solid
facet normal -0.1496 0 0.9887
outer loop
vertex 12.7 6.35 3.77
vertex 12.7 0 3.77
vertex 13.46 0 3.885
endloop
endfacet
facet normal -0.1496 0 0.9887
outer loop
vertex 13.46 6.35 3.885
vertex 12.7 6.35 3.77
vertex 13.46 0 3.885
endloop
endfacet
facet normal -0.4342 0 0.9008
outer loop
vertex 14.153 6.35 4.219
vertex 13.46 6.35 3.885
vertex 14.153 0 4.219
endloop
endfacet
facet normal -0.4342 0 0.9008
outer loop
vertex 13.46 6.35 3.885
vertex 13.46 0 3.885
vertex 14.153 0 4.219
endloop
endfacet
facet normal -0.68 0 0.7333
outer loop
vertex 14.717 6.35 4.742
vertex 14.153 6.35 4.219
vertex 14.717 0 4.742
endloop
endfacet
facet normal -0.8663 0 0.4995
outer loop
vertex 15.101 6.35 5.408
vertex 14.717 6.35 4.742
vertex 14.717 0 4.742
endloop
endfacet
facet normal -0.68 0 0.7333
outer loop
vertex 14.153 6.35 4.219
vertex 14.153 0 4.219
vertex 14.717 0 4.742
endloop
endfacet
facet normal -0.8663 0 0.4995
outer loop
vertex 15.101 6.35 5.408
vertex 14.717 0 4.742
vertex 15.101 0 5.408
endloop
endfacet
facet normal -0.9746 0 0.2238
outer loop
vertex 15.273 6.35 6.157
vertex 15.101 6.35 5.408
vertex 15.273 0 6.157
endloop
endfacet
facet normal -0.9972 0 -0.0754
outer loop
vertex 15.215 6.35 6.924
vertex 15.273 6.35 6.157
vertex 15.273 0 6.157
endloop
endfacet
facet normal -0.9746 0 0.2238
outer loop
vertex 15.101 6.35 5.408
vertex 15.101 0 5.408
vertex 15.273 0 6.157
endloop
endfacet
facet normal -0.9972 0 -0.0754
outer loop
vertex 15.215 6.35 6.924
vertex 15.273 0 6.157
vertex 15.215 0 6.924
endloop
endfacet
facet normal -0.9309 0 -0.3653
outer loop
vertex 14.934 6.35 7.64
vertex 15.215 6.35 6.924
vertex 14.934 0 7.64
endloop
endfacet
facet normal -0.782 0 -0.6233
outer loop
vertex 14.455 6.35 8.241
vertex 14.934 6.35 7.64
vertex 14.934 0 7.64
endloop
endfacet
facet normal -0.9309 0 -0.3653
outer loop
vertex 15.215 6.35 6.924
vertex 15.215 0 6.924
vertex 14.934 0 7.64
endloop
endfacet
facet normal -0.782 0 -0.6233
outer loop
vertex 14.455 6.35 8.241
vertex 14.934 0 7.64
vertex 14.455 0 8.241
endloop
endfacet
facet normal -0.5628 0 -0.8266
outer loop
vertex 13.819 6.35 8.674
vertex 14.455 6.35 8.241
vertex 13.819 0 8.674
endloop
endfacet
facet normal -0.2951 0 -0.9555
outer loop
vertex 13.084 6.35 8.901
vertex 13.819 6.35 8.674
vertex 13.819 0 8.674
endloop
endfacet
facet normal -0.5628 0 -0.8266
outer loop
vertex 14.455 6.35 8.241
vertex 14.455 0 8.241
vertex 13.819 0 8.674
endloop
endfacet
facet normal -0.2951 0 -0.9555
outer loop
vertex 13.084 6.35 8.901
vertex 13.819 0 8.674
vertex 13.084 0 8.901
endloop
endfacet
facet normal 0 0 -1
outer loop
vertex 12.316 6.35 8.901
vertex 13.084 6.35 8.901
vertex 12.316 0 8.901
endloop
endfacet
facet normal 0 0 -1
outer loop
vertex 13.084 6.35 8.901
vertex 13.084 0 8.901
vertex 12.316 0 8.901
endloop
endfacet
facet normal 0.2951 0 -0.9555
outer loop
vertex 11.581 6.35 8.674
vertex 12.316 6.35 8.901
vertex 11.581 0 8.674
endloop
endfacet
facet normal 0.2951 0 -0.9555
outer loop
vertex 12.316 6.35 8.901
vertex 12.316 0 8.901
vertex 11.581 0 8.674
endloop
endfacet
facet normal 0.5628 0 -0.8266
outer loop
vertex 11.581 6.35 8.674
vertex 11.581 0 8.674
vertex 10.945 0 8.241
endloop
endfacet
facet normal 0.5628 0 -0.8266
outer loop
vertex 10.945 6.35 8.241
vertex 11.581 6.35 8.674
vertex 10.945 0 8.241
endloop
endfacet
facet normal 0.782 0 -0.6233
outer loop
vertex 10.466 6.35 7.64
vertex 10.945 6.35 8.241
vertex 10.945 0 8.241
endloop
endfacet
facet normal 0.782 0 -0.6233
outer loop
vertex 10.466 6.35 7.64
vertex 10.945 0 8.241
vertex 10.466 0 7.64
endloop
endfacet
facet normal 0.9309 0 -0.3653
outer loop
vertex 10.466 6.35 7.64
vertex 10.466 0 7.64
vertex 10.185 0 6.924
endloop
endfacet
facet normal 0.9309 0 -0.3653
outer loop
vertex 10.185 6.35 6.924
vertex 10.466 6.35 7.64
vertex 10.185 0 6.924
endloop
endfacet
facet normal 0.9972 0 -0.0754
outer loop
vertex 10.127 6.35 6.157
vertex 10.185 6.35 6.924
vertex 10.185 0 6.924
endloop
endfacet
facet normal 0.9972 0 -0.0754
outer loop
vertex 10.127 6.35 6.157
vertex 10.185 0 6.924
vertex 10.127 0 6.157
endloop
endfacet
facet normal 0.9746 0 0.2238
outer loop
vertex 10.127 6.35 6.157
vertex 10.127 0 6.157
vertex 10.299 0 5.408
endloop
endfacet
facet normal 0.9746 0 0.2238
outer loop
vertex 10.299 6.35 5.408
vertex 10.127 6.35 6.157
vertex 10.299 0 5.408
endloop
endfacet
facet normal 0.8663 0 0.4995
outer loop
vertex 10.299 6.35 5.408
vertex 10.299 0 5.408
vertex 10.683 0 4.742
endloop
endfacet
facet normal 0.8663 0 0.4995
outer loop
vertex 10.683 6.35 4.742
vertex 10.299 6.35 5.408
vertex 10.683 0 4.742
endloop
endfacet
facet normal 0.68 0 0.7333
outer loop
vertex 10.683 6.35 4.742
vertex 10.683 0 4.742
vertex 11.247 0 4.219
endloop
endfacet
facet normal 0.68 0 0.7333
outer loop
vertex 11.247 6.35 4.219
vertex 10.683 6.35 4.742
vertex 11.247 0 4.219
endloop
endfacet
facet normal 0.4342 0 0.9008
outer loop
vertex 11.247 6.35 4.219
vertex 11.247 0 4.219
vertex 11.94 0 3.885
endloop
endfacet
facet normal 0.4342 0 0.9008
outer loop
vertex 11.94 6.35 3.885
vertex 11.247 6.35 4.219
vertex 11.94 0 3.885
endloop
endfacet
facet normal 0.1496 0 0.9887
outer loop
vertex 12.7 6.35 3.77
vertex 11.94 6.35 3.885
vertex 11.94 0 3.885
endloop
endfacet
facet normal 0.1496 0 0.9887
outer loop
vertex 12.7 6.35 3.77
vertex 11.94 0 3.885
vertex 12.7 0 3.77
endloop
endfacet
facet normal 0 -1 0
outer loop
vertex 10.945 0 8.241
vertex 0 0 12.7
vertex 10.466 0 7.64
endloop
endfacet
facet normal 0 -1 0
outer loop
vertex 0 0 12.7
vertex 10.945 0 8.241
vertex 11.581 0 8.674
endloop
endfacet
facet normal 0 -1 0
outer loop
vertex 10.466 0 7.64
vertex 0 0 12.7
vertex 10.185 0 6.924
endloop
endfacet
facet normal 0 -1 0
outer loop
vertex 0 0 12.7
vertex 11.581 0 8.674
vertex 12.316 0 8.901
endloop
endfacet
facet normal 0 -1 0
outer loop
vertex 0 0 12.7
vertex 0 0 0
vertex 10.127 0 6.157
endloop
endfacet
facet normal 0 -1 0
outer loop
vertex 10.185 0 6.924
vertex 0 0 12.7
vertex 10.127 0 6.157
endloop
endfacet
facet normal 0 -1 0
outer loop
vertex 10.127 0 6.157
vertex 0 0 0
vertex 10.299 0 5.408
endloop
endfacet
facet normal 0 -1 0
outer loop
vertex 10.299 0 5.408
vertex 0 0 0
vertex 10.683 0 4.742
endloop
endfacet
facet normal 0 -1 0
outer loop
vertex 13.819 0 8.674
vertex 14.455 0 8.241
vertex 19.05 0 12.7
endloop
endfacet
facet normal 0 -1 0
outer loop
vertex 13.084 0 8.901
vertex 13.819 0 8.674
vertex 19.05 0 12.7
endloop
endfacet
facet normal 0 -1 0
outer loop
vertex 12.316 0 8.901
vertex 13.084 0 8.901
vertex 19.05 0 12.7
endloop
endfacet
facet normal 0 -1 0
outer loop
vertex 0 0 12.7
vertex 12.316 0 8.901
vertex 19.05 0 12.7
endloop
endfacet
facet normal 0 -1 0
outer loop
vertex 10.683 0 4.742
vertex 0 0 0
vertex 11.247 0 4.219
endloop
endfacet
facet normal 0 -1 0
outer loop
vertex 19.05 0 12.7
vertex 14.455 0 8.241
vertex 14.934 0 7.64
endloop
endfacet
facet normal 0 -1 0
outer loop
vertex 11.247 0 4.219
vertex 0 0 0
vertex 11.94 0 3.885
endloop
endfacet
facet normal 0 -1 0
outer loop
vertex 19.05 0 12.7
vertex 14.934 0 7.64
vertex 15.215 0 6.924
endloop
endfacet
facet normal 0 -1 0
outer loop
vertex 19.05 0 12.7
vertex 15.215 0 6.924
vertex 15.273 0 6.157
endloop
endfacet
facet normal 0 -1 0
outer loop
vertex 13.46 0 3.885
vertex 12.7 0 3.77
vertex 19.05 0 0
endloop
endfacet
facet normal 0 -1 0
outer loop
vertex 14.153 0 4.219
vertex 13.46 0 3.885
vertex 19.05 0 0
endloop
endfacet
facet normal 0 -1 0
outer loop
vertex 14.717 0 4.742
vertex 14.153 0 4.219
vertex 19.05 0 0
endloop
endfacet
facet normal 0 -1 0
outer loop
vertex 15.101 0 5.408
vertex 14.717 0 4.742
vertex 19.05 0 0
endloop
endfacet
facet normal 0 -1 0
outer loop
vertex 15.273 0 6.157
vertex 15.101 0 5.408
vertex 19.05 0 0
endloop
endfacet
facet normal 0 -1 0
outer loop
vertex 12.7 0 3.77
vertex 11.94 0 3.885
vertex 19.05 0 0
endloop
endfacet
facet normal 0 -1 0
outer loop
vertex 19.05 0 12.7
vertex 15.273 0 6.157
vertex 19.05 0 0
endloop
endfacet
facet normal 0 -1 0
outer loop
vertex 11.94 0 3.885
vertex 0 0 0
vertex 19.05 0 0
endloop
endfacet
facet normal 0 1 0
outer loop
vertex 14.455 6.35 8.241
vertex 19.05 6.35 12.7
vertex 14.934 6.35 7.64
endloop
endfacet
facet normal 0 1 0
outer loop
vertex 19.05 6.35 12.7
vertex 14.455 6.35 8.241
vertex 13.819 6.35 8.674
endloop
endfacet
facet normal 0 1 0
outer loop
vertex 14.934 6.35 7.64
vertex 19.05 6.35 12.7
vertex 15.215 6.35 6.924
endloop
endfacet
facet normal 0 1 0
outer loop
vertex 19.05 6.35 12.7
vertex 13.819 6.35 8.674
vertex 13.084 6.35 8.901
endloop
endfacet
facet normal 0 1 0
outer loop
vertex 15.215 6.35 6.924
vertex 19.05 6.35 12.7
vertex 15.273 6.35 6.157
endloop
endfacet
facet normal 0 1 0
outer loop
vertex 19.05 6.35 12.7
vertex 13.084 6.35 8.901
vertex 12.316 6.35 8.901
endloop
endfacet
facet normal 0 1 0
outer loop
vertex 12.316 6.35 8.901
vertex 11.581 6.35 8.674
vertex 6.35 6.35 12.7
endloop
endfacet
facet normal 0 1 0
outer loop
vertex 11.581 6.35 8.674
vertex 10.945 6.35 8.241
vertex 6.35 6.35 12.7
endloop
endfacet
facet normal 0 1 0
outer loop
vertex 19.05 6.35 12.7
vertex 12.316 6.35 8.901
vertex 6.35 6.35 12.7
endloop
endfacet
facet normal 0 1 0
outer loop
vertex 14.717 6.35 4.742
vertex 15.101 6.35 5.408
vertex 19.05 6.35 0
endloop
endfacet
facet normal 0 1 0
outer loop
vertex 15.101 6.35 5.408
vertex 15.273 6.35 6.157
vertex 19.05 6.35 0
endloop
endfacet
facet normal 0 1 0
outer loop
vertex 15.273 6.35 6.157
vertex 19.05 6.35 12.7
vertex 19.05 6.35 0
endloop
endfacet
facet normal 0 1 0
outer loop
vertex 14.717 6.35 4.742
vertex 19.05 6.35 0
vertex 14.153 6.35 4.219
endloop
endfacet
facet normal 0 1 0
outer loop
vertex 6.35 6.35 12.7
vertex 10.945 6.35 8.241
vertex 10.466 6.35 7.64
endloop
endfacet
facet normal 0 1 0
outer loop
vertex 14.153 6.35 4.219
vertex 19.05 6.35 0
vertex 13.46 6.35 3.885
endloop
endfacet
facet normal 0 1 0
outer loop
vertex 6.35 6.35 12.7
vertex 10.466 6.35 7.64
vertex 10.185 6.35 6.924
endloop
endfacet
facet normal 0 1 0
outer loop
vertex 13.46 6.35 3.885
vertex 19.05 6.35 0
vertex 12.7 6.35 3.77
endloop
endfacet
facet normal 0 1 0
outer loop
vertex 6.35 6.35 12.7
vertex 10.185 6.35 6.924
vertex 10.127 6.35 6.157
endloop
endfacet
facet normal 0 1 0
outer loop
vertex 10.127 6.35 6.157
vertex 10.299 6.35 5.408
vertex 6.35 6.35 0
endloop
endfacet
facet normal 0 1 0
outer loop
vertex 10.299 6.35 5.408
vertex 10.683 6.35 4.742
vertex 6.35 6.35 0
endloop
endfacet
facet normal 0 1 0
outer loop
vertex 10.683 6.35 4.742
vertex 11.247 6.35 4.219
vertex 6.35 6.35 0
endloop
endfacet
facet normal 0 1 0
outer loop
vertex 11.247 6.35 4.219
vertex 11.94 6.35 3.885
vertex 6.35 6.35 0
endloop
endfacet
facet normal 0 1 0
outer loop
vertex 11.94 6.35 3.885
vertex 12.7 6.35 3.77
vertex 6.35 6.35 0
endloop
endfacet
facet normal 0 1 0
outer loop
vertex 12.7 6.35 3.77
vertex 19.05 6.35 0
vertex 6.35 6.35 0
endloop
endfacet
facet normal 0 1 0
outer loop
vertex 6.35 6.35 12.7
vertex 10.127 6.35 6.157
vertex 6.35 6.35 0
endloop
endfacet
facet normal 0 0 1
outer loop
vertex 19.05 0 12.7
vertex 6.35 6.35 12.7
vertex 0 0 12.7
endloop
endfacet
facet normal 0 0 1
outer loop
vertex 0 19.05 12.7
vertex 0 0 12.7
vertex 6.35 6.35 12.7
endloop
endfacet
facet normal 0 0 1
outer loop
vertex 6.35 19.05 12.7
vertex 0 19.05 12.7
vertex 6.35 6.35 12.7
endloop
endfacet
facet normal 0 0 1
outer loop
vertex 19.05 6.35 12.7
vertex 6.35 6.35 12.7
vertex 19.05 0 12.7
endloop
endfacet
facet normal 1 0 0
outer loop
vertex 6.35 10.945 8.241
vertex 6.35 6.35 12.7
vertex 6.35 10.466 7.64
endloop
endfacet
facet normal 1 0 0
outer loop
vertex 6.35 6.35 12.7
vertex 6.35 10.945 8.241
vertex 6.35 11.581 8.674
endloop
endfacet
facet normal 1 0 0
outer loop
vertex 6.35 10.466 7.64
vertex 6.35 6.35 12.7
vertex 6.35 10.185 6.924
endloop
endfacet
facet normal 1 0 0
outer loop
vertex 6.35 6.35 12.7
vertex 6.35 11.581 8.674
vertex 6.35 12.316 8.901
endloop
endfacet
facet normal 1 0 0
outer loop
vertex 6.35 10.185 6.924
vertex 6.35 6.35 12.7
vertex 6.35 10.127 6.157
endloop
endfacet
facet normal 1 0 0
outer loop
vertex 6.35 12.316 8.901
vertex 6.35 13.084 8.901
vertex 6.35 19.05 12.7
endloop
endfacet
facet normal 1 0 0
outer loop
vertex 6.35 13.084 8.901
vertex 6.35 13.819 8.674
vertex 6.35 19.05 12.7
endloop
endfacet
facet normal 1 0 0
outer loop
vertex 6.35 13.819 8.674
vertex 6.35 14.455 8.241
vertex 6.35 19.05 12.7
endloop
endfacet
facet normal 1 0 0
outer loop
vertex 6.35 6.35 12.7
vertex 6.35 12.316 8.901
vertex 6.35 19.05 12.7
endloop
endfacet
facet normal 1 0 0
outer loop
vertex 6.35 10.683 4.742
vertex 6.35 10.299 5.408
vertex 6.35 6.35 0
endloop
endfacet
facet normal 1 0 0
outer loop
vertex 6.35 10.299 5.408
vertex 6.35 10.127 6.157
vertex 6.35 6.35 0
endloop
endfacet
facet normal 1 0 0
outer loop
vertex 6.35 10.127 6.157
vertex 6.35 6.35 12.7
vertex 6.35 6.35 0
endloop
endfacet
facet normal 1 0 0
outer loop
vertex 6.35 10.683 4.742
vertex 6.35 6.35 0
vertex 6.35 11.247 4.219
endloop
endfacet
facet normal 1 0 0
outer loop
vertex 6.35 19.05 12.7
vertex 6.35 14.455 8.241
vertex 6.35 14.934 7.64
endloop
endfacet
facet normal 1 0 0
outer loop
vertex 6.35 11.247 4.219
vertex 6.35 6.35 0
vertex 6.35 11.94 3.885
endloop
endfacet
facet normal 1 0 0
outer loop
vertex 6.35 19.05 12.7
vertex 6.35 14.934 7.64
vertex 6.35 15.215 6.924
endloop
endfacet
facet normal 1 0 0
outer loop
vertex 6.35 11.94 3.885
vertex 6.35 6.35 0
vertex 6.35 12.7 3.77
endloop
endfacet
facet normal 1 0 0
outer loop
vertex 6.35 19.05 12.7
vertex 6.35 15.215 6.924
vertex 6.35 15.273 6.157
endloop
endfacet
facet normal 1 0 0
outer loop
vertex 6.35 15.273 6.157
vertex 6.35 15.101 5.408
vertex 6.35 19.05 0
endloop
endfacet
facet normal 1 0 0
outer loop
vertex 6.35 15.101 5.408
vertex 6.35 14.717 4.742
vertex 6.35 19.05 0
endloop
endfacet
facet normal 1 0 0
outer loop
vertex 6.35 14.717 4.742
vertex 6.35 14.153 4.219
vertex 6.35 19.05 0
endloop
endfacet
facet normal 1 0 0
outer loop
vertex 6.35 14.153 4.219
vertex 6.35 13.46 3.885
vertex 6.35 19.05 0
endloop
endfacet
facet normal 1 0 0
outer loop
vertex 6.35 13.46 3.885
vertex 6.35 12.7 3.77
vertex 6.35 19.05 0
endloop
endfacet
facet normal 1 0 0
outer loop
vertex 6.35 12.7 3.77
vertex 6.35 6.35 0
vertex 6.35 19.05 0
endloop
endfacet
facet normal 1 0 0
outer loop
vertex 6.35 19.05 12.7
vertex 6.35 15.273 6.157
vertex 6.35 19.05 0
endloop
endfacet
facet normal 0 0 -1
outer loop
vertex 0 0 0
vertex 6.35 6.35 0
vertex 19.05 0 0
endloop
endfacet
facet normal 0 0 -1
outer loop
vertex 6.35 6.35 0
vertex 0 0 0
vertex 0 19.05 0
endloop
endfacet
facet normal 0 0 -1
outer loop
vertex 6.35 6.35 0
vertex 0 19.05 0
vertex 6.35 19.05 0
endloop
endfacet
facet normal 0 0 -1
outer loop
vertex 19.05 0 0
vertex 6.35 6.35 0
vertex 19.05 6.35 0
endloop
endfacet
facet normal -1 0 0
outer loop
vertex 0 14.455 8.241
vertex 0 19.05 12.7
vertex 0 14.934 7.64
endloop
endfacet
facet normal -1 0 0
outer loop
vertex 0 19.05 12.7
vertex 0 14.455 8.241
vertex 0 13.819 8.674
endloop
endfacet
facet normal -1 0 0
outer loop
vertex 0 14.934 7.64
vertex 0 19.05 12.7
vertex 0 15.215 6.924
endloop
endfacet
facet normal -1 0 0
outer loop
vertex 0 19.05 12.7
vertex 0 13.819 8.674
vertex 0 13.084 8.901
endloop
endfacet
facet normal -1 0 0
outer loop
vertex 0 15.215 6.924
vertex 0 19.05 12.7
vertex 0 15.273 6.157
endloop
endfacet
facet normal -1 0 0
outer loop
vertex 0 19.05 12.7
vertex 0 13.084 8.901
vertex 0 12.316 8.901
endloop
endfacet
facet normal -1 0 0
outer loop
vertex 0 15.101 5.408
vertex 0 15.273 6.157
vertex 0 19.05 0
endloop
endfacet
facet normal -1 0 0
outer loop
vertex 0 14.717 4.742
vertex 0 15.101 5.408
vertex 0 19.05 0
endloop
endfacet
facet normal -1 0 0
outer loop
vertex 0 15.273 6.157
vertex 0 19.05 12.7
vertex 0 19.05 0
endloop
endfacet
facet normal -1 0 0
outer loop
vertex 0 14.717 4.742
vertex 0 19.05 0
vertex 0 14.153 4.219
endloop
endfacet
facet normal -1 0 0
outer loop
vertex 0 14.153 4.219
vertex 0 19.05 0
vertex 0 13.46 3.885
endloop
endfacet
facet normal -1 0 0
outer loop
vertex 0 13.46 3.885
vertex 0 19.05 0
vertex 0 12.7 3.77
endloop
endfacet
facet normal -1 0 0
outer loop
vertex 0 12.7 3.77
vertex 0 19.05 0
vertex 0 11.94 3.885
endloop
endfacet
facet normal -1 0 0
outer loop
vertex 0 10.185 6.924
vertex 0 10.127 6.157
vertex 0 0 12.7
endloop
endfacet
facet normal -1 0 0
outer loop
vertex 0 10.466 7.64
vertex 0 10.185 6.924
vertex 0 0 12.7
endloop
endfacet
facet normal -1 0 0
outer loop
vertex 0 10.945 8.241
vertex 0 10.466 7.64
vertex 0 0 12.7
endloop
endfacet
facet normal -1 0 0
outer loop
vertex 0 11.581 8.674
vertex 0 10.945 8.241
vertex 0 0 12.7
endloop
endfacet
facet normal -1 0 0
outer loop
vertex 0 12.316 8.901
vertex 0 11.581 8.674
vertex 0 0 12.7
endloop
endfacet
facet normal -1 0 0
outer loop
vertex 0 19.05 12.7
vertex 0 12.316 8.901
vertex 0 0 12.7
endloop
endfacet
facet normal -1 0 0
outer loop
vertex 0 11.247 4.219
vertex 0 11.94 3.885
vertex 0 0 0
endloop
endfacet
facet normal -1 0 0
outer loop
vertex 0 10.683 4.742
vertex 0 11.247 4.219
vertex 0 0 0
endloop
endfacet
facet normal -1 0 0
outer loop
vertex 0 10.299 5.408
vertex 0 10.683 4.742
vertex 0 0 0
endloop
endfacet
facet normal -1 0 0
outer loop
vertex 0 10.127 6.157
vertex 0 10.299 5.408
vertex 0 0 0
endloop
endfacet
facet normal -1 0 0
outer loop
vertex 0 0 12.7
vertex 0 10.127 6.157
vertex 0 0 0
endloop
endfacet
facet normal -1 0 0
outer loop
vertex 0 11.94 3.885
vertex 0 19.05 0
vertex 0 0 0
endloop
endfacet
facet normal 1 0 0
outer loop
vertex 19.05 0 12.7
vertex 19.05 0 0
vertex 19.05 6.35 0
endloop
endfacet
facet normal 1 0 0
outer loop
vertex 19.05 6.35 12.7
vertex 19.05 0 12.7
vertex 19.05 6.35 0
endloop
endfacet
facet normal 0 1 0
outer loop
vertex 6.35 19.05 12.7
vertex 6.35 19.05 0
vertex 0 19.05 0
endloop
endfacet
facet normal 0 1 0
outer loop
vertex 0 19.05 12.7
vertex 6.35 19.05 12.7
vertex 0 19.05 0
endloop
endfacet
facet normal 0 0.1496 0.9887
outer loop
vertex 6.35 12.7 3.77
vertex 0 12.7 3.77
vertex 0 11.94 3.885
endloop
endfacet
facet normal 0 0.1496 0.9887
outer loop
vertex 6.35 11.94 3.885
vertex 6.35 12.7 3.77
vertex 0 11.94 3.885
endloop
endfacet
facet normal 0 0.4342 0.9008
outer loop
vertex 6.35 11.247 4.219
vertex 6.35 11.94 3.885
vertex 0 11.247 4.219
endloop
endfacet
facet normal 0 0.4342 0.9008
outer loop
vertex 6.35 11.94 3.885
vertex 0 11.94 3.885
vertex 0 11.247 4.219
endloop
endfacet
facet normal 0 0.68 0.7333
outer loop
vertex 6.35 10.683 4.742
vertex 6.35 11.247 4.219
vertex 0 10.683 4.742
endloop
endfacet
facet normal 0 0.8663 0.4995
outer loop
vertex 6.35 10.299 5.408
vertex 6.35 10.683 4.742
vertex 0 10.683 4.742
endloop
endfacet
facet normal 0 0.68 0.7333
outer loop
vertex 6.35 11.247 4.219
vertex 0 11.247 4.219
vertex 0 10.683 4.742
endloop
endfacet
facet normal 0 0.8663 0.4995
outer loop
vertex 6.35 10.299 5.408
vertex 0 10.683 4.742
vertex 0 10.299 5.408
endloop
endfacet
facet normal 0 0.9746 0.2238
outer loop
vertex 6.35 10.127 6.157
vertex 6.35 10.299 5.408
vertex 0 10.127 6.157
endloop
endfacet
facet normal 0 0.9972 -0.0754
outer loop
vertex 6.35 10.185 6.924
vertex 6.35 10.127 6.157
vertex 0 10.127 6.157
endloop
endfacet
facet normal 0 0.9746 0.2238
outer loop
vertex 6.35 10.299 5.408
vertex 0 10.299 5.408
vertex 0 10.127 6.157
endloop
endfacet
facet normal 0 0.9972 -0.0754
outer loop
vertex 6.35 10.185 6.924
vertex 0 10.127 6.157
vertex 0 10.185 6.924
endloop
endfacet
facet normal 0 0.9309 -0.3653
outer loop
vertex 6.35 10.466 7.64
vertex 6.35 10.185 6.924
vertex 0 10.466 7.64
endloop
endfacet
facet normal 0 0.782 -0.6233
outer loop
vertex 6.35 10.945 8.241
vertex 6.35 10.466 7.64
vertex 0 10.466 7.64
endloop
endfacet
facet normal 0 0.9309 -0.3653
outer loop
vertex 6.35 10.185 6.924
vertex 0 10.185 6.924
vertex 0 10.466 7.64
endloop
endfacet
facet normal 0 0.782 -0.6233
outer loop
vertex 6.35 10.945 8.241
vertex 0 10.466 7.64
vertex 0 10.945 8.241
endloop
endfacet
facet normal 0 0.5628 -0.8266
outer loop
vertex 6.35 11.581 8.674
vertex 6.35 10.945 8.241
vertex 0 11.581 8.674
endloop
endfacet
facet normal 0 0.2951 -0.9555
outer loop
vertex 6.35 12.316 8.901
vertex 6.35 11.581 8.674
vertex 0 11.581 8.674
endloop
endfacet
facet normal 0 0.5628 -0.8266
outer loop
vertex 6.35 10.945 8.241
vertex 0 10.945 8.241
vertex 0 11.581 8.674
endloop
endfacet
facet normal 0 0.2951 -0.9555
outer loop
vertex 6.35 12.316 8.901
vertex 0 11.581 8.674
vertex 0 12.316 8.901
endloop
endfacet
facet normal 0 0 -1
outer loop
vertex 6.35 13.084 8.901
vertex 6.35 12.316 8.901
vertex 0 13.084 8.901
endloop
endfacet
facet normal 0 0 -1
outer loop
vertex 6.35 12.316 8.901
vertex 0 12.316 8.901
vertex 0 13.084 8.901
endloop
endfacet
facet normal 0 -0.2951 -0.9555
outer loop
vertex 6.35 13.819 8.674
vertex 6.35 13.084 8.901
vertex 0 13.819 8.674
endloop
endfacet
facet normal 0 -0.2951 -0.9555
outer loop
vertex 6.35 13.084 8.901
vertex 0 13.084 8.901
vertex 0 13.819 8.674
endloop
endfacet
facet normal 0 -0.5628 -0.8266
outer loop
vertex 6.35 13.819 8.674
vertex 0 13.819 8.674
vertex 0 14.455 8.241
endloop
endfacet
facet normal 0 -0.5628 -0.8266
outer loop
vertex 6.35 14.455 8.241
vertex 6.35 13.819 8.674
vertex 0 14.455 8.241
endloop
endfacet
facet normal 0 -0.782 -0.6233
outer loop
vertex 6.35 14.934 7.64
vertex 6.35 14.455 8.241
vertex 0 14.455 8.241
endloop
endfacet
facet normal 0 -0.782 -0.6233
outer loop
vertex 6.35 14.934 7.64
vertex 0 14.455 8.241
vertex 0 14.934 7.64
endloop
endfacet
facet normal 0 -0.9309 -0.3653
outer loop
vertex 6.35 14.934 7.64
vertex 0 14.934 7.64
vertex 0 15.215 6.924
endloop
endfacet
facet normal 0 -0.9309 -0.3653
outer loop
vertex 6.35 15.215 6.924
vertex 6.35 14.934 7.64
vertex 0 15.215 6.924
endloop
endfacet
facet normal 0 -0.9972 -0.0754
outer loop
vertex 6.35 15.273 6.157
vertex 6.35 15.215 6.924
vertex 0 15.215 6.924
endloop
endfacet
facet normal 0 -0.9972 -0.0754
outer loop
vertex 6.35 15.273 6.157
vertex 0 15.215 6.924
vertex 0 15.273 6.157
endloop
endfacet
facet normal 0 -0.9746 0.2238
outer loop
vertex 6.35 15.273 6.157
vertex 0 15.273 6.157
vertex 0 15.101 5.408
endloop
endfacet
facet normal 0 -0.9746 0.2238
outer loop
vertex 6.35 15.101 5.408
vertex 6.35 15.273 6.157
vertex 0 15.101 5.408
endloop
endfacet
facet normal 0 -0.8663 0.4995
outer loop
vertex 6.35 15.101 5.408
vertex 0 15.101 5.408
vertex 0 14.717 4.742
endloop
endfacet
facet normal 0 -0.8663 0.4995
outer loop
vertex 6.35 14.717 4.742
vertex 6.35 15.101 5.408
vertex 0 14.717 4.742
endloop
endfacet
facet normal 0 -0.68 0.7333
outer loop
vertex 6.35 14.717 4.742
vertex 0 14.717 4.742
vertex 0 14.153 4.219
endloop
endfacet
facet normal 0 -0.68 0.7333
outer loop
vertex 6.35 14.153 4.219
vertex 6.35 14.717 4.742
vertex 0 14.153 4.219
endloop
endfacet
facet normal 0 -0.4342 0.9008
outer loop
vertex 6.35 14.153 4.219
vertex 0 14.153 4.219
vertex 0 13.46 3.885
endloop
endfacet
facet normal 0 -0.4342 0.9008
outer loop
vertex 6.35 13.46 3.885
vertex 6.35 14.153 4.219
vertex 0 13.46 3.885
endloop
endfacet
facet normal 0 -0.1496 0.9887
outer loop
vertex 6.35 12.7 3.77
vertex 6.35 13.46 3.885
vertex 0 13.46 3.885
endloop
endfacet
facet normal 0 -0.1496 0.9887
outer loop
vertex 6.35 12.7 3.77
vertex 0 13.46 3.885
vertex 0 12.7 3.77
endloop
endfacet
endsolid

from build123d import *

# Parameters (mm, degrees)
BOSS_EXTRUDE1_DEPTH                        = 12.7
F_13_64_0_20313_DIAMETER_HOLE1_D           = 5.159502
F_13_64_0_20313_DIAMETER_HOLE1_ON_FACE_2_D = 5.159502


with BuildPart() as part:
    # Sketch1 → Boss-Extrude1 (new body)
    with BuildSketch(Plane.XY):
        Polygon((0, 0), (11.162631579, 0), (19.05, 0), (19.05, 6.35), (6.35, 6.35), (6.35, 19.05), (0, 19.05), align=None)
    extrude(amount=BOSS_EXTRUDE1_DEPTH)

    # 13/64 (0.20313) Diameter Hole1 (through all)
    with Locations(Plane(origin=(6.35, 12.7, 6.35), x_dir=(0, 0, 1), z_dir=(1, 0, 0))):
        with Locations((0, 0)):
            Hole(F_13_64_0_20313_DIAMETER_HOLE1_D / 2)

    # 13/64 (0.20313) Diameter Hole1 on face 2 (through all)
    with Locations(Plane(origin=(12.7, 6.35, 6.35), x_dir=(0, 0, 1), z_dir=(0, 1, 0))):
        with Locations((0, 0)):
            Hole(F_13_64_0_20313_DIAMETER_HOLE1_ON_FACE_2_D / 2)


solid = part.part
